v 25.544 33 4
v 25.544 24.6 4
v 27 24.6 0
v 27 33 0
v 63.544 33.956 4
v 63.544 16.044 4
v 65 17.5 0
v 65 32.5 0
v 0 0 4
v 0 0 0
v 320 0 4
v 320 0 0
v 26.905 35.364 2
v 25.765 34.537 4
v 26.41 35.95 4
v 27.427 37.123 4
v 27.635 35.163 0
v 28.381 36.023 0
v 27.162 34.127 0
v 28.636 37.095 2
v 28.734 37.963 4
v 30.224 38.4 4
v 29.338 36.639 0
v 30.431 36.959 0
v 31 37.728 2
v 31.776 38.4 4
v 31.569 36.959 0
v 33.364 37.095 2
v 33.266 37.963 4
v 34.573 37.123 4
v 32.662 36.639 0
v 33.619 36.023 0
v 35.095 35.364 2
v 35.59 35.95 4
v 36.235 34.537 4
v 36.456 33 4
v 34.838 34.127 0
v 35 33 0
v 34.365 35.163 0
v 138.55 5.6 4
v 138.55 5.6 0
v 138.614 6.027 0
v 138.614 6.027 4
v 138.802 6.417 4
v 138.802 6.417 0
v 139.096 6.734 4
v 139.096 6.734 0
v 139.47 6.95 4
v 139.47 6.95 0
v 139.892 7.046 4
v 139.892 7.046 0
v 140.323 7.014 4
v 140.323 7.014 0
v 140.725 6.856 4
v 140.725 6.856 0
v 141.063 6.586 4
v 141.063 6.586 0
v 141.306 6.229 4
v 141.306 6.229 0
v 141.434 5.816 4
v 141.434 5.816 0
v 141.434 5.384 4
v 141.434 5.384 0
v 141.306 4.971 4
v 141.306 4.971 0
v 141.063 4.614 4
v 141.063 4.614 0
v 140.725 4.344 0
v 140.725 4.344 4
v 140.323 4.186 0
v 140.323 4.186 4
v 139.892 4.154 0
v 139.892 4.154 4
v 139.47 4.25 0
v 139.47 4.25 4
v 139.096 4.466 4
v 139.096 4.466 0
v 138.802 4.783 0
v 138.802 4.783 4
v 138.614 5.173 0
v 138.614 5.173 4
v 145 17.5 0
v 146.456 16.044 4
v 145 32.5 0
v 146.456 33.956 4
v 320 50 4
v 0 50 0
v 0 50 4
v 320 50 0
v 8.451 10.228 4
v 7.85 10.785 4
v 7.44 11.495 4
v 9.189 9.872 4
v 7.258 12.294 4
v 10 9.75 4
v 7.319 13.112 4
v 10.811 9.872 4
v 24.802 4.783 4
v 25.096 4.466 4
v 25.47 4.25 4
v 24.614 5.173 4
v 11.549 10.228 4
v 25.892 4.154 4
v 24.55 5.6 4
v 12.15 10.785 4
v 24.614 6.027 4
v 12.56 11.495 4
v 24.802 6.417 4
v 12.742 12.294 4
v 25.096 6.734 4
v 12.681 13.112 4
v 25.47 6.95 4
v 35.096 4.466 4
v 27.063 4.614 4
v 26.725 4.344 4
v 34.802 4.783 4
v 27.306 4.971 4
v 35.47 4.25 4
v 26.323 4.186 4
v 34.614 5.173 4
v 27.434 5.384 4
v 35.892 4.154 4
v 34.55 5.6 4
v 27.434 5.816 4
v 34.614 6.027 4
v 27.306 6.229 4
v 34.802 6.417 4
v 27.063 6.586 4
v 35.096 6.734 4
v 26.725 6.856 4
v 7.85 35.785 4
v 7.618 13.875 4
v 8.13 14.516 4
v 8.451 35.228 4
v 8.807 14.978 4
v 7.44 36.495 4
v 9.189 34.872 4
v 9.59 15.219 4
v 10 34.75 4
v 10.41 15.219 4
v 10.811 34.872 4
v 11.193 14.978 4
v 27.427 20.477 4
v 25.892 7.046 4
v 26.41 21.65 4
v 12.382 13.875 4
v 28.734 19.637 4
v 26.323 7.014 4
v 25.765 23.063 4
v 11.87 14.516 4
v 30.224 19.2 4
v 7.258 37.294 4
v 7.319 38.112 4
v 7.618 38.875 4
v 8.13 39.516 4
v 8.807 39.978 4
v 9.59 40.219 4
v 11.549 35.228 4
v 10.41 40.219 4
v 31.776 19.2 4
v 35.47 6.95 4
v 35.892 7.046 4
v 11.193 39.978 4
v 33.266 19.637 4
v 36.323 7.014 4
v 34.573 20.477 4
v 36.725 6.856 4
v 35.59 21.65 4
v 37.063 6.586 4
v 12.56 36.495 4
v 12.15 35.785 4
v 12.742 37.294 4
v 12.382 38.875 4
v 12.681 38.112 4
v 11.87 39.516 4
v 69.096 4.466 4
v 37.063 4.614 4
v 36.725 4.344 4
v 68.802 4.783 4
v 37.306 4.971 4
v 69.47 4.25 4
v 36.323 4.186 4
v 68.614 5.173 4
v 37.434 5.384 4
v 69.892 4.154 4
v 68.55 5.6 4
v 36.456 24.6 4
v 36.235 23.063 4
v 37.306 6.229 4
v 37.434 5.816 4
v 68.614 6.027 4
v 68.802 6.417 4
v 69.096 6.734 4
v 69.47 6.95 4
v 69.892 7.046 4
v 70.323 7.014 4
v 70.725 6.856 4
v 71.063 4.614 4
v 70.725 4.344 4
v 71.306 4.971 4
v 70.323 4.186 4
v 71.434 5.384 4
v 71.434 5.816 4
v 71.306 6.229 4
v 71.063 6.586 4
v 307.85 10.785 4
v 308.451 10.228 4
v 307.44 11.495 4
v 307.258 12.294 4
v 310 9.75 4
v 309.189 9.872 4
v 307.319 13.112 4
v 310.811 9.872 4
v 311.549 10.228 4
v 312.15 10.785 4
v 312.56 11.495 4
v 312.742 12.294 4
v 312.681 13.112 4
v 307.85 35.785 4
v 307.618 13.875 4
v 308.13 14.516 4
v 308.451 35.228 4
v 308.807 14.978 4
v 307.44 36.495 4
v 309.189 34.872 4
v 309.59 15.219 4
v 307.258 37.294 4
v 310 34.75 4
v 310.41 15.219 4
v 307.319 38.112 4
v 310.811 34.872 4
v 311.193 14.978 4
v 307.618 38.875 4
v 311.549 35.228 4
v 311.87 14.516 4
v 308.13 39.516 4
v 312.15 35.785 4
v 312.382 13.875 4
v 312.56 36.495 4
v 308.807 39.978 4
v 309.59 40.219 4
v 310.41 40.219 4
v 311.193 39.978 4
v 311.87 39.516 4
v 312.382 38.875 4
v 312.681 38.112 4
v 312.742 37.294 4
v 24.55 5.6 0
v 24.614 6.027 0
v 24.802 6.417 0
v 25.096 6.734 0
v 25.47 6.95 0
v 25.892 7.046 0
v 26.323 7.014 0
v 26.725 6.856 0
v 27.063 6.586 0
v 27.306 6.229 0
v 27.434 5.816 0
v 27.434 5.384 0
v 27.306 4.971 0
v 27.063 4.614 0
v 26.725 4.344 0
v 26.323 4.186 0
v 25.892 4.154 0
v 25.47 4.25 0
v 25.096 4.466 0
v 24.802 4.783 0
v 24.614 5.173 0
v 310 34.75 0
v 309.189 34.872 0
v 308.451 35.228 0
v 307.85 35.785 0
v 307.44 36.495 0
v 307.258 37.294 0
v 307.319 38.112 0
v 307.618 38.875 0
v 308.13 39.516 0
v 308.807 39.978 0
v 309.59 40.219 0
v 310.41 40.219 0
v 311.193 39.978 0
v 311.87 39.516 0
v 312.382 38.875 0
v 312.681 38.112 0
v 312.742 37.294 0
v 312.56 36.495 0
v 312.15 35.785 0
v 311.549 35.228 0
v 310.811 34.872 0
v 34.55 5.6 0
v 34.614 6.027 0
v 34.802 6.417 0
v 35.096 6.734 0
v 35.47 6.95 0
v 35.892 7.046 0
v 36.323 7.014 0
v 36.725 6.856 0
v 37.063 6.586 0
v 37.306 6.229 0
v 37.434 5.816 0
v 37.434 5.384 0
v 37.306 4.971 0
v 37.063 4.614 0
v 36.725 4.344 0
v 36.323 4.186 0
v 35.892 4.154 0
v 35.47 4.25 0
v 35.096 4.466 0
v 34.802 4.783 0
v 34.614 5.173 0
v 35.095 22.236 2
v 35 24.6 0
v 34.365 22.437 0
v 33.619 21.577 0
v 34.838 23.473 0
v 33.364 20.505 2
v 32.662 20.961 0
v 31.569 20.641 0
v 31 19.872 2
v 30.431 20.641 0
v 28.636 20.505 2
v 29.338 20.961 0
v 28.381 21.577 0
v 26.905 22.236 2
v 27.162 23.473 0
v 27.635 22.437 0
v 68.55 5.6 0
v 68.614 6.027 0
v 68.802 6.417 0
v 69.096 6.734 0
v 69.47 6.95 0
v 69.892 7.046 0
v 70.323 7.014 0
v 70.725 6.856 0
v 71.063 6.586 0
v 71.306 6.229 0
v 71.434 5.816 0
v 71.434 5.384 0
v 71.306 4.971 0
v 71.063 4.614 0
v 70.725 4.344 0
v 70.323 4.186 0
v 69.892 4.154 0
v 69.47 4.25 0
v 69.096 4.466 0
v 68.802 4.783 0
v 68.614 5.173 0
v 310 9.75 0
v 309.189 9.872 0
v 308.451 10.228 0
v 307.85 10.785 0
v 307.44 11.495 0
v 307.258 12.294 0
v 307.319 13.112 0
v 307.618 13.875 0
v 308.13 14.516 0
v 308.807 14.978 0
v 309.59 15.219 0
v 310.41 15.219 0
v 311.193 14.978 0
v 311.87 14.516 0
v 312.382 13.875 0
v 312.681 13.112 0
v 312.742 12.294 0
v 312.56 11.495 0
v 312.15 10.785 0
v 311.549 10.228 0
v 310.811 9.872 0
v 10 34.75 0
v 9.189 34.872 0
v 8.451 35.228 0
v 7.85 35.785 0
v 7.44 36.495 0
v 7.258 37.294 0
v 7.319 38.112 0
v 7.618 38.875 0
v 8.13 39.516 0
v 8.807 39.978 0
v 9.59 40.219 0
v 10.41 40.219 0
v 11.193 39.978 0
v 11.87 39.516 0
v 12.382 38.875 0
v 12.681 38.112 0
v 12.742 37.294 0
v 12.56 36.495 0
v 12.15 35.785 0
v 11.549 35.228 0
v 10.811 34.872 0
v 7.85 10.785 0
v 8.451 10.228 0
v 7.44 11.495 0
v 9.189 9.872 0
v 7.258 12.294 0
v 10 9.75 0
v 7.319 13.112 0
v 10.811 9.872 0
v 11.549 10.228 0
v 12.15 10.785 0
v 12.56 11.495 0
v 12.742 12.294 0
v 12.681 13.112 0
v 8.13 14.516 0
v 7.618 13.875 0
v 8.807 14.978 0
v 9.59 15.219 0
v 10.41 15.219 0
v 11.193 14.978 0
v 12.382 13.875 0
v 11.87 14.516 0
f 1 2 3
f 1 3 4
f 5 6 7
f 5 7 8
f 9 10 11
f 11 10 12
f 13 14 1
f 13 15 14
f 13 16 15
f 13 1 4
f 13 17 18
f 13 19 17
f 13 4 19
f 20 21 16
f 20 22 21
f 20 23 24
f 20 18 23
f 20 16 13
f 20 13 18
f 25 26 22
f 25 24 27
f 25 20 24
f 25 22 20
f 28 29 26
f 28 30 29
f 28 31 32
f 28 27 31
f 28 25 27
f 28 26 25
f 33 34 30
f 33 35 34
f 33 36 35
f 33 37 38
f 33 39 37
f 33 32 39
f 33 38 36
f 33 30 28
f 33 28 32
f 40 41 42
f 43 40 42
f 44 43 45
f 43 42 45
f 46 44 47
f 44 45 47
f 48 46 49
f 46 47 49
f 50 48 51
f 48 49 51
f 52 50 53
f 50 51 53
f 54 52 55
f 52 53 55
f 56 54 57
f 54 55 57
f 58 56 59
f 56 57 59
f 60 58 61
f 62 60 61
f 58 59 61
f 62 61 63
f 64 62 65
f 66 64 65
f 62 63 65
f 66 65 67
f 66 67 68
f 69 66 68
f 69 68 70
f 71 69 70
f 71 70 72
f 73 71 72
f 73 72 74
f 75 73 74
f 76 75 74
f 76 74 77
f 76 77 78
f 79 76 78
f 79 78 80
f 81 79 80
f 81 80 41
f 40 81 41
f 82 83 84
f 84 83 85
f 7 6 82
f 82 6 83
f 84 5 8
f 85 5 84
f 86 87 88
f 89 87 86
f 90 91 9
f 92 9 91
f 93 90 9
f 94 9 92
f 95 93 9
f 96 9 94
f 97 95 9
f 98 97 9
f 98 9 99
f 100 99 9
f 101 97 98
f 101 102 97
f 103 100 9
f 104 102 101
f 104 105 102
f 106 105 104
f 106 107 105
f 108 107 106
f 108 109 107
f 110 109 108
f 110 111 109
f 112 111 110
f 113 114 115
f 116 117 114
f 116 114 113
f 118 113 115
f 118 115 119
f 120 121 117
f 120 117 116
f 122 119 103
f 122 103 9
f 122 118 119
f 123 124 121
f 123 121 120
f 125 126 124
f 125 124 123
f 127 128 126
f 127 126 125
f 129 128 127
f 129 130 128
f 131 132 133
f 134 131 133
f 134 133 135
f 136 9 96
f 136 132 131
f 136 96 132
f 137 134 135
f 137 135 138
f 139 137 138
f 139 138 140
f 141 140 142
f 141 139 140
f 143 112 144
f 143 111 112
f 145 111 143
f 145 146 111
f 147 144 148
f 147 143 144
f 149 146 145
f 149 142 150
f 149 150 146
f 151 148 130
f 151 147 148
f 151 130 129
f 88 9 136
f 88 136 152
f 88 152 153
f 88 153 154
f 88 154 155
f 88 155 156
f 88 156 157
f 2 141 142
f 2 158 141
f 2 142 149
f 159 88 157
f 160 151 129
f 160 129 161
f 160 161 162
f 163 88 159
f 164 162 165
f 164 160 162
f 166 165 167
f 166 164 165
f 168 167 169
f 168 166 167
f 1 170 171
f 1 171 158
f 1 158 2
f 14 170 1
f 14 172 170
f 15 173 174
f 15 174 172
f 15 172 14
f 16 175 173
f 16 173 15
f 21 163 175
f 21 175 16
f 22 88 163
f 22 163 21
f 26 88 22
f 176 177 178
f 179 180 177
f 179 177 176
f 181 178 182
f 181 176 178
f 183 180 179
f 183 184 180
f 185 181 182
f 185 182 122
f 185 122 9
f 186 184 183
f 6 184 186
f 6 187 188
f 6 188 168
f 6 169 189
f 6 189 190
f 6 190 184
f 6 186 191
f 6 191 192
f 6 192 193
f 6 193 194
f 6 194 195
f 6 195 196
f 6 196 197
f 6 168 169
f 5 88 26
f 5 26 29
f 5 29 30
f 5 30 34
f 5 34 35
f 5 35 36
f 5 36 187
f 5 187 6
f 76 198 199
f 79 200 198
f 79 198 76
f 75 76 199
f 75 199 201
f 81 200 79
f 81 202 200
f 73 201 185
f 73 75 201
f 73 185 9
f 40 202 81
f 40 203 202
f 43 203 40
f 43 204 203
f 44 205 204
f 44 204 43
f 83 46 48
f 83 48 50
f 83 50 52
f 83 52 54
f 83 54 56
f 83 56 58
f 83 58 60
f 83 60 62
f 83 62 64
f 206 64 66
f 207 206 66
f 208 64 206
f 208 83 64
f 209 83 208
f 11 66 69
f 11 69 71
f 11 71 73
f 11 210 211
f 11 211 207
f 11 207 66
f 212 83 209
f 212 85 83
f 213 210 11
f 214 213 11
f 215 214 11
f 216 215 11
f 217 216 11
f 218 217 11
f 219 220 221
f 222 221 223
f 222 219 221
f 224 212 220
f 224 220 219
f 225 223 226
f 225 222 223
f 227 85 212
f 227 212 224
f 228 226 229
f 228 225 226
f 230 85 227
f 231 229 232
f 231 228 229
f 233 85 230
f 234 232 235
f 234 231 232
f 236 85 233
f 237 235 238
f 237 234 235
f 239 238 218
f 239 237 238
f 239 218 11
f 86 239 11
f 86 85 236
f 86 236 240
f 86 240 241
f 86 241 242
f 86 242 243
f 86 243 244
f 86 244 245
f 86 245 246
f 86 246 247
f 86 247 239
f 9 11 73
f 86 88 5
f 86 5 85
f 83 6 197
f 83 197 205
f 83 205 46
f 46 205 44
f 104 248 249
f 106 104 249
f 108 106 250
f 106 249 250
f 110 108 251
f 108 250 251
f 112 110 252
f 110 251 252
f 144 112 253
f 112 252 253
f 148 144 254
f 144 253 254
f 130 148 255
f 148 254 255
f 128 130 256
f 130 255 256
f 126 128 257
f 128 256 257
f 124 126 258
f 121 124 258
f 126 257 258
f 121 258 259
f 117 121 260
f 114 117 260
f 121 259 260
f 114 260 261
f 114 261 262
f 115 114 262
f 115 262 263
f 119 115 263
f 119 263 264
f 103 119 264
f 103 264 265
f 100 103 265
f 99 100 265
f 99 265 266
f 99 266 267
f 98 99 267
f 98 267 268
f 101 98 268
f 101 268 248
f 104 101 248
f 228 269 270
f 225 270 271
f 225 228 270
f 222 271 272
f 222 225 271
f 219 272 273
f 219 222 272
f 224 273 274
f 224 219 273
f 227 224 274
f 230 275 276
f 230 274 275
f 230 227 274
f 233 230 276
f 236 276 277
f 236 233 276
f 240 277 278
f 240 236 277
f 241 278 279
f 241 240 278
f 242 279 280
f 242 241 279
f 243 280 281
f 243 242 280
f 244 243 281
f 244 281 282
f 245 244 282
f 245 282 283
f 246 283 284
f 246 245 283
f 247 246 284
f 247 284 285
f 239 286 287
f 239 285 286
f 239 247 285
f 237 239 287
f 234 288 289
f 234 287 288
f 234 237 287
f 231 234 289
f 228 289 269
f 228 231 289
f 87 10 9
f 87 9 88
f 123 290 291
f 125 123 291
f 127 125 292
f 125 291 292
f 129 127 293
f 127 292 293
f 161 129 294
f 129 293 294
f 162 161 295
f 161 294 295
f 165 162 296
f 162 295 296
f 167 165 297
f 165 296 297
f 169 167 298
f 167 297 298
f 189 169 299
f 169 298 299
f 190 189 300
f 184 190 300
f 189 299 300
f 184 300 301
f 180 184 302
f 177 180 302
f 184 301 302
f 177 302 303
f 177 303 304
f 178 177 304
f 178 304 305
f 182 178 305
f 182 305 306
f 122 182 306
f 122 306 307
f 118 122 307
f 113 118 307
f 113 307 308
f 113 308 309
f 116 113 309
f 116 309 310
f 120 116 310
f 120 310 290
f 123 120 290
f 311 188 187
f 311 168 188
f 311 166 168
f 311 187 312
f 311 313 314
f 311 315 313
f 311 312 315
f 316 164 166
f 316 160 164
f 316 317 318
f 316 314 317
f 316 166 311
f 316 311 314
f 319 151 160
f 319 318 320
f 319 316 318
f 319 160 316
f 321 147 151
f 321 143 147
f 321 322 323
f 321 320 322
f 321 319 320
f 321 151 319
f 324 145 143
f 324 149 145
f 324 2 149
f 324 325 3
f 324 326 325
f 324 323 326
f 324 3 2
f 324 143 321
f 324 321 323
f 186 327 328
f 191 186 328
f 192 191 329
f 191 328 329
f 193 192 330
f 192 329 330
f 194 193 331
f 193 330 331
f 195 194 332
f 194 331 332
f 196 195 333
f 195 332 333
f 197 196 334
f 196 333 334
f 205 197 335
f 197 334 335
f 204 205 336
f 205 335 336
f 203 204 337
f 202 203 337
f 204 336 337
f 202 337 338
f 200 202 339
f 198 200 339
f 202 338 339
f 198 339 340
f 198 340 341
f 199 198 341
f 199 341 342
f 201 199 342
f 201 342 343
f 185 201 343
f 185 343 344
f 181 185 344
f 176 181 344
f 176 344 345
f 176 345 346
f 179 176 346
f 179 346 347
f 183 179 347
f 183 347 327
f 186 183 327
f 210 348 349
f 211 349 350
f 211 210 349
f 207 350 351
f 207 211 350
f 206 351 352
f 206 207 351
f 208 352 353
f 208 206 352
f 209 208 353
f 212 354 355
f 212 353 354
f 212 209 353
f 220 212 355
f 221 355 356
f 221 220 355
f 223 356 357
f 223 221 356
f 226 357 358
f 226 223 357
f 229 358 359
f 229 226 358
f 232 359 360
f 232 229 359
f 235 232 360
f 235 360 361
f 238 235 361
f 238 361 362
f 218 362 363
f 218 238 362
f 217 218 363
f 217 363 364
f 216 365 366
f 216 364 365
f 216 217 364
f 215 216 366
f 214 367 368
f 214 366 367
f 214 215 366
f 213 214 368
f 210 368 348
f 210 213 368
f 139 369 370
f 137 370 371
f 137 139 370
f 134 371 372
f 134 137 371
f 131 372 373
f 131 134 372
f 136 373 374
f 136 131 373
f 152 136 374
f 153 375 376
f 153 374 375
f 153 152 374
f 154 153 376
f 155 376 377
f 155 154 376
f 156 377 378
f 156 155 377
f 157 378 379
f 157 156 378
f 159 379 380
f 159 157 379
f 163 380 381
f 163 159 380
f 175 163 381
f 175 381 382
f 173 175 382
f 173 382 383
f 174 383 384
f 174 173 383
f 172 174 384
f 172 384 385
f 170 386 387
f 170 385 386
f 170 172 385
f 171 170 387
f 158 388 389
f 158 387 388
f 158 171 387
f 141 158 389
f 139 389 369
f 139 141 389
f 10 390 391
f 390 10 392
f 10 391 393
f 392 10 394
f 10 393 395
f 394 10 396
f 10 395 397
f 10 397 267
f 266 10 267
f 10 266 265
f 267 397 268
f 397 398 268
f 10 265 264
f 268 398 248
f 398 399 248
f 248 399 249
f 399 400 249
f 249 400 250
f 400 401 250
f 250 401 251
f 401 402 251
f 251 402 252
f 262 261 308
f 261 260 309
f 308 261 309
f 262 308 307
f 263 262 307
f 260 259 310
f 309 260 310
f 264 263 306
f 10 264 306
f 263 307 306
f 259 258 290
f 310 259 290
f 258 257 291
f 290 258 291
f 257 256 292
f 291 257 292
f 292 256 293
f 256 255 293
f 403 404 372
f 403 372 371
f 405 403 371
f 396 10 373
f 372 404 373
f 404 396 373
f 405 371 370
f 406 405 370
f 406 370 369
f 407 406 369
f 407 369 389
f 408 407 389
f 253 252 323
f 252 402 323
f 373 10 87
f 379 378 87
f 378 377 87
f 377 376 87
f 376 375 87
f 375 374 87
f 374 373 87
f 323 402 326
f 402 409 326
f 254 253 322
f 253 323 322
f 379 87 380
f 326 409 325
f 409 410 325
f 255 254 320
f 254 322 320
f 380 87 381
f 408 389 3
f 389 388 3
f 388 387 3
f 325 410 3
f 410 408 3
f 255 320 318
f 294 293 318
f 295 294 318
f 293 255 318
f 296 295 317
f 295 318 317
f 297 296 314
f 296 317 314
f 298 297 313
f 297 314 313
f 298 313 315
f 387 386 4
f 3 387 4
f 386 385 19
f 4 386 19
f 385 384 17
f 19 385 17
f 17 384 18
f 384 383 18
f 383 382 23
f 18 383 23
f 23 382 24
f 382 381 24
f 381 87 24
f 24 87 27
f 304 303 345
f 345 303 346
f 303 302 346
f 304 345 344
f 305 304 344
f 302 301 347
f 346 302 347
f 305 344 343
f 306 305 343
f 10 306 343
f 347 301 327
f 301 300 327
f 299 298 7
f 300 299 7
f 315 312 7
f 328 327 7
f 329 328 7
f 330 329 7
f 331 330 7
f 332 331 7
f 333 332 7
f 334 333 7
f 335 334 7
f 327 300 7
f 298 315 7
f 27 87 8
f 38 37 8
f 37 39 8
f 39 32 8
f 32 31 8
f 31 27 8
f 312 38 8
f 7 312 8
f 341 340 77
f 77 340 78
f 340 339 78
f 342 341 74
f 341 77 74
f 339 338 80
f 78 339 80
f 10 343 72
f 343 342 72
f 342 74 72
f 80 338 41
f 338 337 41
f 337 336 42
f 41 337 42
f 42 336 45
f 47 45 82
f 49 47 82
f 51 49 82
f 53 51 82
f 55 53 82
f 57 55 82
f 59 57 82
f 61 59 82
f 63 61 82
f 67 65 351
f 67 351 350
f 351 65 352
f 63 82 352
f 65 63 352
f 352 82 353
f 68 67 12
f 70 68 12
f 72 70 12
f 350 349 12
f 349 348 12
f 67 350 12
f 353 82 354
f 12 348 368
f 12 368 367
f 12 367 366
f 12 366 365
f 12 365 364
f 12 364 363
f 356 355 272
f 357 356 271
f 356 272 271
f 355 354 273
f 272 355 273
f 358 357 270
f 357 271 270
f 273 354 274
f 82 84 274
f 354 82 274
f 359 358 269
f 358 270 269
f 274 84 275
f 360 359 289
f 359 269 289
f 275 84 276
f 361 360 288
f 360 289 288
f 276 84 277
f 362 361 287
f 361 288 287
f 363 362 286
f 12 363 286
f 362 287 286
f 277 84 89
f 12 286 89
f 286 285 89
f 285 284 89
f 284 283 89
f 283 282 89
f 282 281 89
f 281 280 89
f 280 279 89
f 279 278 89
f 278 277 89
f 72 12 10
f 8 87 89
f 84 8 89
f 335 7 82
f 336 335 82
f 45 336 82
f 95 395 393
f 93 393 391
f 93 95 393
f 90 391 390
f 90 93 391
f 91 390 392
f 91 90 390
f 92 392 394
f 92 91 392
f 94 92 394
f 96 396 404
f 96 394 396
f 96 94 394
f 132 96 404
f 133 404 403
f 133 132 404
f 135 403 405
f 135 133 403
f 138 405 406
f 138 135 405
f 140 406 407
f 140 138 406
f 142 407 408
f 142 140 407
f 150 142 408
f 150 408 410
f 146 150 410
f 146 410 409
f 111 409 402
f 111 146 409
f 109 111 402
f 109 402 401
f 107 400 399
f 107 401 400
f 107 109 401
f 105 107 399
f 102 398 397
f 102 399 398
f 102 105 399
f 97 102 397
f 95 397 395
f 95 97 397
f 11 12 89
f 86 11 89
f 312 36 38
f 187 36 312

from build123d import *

# Parameters (mm, degrees)
SKETCH1_W                     = 320
SKETCH1_H                     = 50
BOSS_EXTRUDE1_DEPTH           = 4
M5_CLEARANCE_HOLE1_AT_2_COUNT = 2
M5_CLEARANCE_HOLE1_AT_2_PITCH = 300
LPATTERN1_COUNT               = 2
LPATTERN1_PITCH               = 25
SKETCH5_W                     = 80
SKETCH5_H                     = 15
CUT_EXTRUDE1_DEPTH            = 324.907394173
CUT_EXTRUDE3_DEPTH            = 324.907394173
M2_5_CLEARANCE_HOLE1_D        = 2.9
M2_5_CLEARANCE_HOLE1_DEPTH    = 14
M2_5_CLEARANCE_HOLE1_TIP      = 0.871247898
DRAFT1_ANGLE                  = -20


with BuildPart() as part:
    # Sketch1 → Boss-Extrude1 (new body)
    with BuildSketch(Plane.XY):
        with Locations((160, 25)):
            Rectangle(SKETCH1_W, SKETCH1_H)
    extrude(amount=BOSS_EXTRUDE1_DEPTH)

    # Sketch4 → M5 Clearance Hole1 (revolve, cut)
    with BuildSketch(Plane(origin=(310, 37.5, 4), x_dir=(0, -1, 0), z_dir=(1, 0, 0))):
        Polygon((0, 0), (0, 15.652366702), (2.75, 14), (2.75, 0), align=None)
    m5_clearance_hole1 = revolve(axis=Axis((310, 37.5, 10.35), (0, 0, -1)), mode=Mode.SUBTRACT)

    # M5 Clearance Hole1 at 2: M5 Clearance Hole1 ×2
    with Locations(*[(-i * M5_CLEARANCE_HOLE1_AT_2_PITCH, 0, 0) for i in range(1, M5_CLEARANCE_HOLE1_AT_2_COUNT)]):
        add(m5_clearance_hole1, mode=Mode.SUBTRACT)

    # LPattern1: M5 Clearance Hole1 ×2
    with Locations(*[(0, -i * LPATTERN1_PITCH, 0) for i in range(1, LPATTERN1_COUNT)]):
        add(m5_clearance_hole1, mode=Mode.SUBTRACT)

    # LPattern1 copy 1 sketch → LPattern1 copy 1 (revolve, cut)
    with BuildSketch(Plane(origin=(10, 12.5, 4), x_dir=(0, -1, 0), z_dir=(1, 0, 0))):
        Polygon((0, 0), (0, 15.652366702), (2.75, 14), (2.75, 0), align=None)
    revolve(axis=Axis((10, 12.5, 10.35), (0, 0, -1)), mode=Mode.SUBTRACT)

    # Sketch5 → Cut-Extrude1 (cut, through all)
    with BuildSketch(Plane.XY.offset(4)):
        with Locations((105, 25)):
            Rectangle(SKETCH5_W, SKETCH5_H)
    extrude(amount=-CUT_EXTRUDE1_DEPTH, mode=Mode.SUBTRACT)

    # Sketch6 → Cut-Extrude3 (cut, through all)
    with BuildSketch(Plane.XY.offset(4)):
        with BuildLine():
            Line((27, 24.6), (27, 33))
            ThreePointArc((27, 33), (31, 37), (35, 33))
            Line((35, 33), (35, 24.6))
            ThreePointArc((35, 24.6), (31, 20.6), (27, 24.6))
        make_face()
    extrude(amount=-CUT_EXTRUDE3_DEPTH, mode=Mode.SUBTRACT)

    # M2.5 Clearance Hole1
    with Locations(Plane.XY.offset(4)):
        with Locations((140, 5.6), (26, 5.6), (36, 5.6), (70, 5.6)):
            Hole(M2_5_CLEARANCE_HOLE1_D / 2, depth=M2_5_CLEARANCE_HOLE1_DEPTH)
            with Locations((0, 0, -(M2_5_CLEARANCE_HOLE1_DEPTH + M2_5_CLEARANCE_HOLE1_TIP / 2))):  # 118° drill point
                Cone(0, M2_5_CLEARANCE_HOLE1_D / 2, M2_5_CLEARANCE_HOLE1_TIP, mode=Mode.SUBTRACT)

    # Draft1
    draft1_faces = [part.faces().sort_by_distance(p)[0] for p in [
        (145, 25, 2),
        (105, 32.5, 2),
        (65, 25, 2),
        (105, 17.5, 2),
        (35, 28.8, 2),
        (31, 37, 2),
        (27, 28.8, 2),
        (31, 20.6, 2),
    ]]
    draft(draft1_faces, Plane(origin=(0, 0, 0), x_dir=(-1, 0, 0), z_dir=(0, 0, -1)), DRAFT1_ANGLE)


solid = part.part
